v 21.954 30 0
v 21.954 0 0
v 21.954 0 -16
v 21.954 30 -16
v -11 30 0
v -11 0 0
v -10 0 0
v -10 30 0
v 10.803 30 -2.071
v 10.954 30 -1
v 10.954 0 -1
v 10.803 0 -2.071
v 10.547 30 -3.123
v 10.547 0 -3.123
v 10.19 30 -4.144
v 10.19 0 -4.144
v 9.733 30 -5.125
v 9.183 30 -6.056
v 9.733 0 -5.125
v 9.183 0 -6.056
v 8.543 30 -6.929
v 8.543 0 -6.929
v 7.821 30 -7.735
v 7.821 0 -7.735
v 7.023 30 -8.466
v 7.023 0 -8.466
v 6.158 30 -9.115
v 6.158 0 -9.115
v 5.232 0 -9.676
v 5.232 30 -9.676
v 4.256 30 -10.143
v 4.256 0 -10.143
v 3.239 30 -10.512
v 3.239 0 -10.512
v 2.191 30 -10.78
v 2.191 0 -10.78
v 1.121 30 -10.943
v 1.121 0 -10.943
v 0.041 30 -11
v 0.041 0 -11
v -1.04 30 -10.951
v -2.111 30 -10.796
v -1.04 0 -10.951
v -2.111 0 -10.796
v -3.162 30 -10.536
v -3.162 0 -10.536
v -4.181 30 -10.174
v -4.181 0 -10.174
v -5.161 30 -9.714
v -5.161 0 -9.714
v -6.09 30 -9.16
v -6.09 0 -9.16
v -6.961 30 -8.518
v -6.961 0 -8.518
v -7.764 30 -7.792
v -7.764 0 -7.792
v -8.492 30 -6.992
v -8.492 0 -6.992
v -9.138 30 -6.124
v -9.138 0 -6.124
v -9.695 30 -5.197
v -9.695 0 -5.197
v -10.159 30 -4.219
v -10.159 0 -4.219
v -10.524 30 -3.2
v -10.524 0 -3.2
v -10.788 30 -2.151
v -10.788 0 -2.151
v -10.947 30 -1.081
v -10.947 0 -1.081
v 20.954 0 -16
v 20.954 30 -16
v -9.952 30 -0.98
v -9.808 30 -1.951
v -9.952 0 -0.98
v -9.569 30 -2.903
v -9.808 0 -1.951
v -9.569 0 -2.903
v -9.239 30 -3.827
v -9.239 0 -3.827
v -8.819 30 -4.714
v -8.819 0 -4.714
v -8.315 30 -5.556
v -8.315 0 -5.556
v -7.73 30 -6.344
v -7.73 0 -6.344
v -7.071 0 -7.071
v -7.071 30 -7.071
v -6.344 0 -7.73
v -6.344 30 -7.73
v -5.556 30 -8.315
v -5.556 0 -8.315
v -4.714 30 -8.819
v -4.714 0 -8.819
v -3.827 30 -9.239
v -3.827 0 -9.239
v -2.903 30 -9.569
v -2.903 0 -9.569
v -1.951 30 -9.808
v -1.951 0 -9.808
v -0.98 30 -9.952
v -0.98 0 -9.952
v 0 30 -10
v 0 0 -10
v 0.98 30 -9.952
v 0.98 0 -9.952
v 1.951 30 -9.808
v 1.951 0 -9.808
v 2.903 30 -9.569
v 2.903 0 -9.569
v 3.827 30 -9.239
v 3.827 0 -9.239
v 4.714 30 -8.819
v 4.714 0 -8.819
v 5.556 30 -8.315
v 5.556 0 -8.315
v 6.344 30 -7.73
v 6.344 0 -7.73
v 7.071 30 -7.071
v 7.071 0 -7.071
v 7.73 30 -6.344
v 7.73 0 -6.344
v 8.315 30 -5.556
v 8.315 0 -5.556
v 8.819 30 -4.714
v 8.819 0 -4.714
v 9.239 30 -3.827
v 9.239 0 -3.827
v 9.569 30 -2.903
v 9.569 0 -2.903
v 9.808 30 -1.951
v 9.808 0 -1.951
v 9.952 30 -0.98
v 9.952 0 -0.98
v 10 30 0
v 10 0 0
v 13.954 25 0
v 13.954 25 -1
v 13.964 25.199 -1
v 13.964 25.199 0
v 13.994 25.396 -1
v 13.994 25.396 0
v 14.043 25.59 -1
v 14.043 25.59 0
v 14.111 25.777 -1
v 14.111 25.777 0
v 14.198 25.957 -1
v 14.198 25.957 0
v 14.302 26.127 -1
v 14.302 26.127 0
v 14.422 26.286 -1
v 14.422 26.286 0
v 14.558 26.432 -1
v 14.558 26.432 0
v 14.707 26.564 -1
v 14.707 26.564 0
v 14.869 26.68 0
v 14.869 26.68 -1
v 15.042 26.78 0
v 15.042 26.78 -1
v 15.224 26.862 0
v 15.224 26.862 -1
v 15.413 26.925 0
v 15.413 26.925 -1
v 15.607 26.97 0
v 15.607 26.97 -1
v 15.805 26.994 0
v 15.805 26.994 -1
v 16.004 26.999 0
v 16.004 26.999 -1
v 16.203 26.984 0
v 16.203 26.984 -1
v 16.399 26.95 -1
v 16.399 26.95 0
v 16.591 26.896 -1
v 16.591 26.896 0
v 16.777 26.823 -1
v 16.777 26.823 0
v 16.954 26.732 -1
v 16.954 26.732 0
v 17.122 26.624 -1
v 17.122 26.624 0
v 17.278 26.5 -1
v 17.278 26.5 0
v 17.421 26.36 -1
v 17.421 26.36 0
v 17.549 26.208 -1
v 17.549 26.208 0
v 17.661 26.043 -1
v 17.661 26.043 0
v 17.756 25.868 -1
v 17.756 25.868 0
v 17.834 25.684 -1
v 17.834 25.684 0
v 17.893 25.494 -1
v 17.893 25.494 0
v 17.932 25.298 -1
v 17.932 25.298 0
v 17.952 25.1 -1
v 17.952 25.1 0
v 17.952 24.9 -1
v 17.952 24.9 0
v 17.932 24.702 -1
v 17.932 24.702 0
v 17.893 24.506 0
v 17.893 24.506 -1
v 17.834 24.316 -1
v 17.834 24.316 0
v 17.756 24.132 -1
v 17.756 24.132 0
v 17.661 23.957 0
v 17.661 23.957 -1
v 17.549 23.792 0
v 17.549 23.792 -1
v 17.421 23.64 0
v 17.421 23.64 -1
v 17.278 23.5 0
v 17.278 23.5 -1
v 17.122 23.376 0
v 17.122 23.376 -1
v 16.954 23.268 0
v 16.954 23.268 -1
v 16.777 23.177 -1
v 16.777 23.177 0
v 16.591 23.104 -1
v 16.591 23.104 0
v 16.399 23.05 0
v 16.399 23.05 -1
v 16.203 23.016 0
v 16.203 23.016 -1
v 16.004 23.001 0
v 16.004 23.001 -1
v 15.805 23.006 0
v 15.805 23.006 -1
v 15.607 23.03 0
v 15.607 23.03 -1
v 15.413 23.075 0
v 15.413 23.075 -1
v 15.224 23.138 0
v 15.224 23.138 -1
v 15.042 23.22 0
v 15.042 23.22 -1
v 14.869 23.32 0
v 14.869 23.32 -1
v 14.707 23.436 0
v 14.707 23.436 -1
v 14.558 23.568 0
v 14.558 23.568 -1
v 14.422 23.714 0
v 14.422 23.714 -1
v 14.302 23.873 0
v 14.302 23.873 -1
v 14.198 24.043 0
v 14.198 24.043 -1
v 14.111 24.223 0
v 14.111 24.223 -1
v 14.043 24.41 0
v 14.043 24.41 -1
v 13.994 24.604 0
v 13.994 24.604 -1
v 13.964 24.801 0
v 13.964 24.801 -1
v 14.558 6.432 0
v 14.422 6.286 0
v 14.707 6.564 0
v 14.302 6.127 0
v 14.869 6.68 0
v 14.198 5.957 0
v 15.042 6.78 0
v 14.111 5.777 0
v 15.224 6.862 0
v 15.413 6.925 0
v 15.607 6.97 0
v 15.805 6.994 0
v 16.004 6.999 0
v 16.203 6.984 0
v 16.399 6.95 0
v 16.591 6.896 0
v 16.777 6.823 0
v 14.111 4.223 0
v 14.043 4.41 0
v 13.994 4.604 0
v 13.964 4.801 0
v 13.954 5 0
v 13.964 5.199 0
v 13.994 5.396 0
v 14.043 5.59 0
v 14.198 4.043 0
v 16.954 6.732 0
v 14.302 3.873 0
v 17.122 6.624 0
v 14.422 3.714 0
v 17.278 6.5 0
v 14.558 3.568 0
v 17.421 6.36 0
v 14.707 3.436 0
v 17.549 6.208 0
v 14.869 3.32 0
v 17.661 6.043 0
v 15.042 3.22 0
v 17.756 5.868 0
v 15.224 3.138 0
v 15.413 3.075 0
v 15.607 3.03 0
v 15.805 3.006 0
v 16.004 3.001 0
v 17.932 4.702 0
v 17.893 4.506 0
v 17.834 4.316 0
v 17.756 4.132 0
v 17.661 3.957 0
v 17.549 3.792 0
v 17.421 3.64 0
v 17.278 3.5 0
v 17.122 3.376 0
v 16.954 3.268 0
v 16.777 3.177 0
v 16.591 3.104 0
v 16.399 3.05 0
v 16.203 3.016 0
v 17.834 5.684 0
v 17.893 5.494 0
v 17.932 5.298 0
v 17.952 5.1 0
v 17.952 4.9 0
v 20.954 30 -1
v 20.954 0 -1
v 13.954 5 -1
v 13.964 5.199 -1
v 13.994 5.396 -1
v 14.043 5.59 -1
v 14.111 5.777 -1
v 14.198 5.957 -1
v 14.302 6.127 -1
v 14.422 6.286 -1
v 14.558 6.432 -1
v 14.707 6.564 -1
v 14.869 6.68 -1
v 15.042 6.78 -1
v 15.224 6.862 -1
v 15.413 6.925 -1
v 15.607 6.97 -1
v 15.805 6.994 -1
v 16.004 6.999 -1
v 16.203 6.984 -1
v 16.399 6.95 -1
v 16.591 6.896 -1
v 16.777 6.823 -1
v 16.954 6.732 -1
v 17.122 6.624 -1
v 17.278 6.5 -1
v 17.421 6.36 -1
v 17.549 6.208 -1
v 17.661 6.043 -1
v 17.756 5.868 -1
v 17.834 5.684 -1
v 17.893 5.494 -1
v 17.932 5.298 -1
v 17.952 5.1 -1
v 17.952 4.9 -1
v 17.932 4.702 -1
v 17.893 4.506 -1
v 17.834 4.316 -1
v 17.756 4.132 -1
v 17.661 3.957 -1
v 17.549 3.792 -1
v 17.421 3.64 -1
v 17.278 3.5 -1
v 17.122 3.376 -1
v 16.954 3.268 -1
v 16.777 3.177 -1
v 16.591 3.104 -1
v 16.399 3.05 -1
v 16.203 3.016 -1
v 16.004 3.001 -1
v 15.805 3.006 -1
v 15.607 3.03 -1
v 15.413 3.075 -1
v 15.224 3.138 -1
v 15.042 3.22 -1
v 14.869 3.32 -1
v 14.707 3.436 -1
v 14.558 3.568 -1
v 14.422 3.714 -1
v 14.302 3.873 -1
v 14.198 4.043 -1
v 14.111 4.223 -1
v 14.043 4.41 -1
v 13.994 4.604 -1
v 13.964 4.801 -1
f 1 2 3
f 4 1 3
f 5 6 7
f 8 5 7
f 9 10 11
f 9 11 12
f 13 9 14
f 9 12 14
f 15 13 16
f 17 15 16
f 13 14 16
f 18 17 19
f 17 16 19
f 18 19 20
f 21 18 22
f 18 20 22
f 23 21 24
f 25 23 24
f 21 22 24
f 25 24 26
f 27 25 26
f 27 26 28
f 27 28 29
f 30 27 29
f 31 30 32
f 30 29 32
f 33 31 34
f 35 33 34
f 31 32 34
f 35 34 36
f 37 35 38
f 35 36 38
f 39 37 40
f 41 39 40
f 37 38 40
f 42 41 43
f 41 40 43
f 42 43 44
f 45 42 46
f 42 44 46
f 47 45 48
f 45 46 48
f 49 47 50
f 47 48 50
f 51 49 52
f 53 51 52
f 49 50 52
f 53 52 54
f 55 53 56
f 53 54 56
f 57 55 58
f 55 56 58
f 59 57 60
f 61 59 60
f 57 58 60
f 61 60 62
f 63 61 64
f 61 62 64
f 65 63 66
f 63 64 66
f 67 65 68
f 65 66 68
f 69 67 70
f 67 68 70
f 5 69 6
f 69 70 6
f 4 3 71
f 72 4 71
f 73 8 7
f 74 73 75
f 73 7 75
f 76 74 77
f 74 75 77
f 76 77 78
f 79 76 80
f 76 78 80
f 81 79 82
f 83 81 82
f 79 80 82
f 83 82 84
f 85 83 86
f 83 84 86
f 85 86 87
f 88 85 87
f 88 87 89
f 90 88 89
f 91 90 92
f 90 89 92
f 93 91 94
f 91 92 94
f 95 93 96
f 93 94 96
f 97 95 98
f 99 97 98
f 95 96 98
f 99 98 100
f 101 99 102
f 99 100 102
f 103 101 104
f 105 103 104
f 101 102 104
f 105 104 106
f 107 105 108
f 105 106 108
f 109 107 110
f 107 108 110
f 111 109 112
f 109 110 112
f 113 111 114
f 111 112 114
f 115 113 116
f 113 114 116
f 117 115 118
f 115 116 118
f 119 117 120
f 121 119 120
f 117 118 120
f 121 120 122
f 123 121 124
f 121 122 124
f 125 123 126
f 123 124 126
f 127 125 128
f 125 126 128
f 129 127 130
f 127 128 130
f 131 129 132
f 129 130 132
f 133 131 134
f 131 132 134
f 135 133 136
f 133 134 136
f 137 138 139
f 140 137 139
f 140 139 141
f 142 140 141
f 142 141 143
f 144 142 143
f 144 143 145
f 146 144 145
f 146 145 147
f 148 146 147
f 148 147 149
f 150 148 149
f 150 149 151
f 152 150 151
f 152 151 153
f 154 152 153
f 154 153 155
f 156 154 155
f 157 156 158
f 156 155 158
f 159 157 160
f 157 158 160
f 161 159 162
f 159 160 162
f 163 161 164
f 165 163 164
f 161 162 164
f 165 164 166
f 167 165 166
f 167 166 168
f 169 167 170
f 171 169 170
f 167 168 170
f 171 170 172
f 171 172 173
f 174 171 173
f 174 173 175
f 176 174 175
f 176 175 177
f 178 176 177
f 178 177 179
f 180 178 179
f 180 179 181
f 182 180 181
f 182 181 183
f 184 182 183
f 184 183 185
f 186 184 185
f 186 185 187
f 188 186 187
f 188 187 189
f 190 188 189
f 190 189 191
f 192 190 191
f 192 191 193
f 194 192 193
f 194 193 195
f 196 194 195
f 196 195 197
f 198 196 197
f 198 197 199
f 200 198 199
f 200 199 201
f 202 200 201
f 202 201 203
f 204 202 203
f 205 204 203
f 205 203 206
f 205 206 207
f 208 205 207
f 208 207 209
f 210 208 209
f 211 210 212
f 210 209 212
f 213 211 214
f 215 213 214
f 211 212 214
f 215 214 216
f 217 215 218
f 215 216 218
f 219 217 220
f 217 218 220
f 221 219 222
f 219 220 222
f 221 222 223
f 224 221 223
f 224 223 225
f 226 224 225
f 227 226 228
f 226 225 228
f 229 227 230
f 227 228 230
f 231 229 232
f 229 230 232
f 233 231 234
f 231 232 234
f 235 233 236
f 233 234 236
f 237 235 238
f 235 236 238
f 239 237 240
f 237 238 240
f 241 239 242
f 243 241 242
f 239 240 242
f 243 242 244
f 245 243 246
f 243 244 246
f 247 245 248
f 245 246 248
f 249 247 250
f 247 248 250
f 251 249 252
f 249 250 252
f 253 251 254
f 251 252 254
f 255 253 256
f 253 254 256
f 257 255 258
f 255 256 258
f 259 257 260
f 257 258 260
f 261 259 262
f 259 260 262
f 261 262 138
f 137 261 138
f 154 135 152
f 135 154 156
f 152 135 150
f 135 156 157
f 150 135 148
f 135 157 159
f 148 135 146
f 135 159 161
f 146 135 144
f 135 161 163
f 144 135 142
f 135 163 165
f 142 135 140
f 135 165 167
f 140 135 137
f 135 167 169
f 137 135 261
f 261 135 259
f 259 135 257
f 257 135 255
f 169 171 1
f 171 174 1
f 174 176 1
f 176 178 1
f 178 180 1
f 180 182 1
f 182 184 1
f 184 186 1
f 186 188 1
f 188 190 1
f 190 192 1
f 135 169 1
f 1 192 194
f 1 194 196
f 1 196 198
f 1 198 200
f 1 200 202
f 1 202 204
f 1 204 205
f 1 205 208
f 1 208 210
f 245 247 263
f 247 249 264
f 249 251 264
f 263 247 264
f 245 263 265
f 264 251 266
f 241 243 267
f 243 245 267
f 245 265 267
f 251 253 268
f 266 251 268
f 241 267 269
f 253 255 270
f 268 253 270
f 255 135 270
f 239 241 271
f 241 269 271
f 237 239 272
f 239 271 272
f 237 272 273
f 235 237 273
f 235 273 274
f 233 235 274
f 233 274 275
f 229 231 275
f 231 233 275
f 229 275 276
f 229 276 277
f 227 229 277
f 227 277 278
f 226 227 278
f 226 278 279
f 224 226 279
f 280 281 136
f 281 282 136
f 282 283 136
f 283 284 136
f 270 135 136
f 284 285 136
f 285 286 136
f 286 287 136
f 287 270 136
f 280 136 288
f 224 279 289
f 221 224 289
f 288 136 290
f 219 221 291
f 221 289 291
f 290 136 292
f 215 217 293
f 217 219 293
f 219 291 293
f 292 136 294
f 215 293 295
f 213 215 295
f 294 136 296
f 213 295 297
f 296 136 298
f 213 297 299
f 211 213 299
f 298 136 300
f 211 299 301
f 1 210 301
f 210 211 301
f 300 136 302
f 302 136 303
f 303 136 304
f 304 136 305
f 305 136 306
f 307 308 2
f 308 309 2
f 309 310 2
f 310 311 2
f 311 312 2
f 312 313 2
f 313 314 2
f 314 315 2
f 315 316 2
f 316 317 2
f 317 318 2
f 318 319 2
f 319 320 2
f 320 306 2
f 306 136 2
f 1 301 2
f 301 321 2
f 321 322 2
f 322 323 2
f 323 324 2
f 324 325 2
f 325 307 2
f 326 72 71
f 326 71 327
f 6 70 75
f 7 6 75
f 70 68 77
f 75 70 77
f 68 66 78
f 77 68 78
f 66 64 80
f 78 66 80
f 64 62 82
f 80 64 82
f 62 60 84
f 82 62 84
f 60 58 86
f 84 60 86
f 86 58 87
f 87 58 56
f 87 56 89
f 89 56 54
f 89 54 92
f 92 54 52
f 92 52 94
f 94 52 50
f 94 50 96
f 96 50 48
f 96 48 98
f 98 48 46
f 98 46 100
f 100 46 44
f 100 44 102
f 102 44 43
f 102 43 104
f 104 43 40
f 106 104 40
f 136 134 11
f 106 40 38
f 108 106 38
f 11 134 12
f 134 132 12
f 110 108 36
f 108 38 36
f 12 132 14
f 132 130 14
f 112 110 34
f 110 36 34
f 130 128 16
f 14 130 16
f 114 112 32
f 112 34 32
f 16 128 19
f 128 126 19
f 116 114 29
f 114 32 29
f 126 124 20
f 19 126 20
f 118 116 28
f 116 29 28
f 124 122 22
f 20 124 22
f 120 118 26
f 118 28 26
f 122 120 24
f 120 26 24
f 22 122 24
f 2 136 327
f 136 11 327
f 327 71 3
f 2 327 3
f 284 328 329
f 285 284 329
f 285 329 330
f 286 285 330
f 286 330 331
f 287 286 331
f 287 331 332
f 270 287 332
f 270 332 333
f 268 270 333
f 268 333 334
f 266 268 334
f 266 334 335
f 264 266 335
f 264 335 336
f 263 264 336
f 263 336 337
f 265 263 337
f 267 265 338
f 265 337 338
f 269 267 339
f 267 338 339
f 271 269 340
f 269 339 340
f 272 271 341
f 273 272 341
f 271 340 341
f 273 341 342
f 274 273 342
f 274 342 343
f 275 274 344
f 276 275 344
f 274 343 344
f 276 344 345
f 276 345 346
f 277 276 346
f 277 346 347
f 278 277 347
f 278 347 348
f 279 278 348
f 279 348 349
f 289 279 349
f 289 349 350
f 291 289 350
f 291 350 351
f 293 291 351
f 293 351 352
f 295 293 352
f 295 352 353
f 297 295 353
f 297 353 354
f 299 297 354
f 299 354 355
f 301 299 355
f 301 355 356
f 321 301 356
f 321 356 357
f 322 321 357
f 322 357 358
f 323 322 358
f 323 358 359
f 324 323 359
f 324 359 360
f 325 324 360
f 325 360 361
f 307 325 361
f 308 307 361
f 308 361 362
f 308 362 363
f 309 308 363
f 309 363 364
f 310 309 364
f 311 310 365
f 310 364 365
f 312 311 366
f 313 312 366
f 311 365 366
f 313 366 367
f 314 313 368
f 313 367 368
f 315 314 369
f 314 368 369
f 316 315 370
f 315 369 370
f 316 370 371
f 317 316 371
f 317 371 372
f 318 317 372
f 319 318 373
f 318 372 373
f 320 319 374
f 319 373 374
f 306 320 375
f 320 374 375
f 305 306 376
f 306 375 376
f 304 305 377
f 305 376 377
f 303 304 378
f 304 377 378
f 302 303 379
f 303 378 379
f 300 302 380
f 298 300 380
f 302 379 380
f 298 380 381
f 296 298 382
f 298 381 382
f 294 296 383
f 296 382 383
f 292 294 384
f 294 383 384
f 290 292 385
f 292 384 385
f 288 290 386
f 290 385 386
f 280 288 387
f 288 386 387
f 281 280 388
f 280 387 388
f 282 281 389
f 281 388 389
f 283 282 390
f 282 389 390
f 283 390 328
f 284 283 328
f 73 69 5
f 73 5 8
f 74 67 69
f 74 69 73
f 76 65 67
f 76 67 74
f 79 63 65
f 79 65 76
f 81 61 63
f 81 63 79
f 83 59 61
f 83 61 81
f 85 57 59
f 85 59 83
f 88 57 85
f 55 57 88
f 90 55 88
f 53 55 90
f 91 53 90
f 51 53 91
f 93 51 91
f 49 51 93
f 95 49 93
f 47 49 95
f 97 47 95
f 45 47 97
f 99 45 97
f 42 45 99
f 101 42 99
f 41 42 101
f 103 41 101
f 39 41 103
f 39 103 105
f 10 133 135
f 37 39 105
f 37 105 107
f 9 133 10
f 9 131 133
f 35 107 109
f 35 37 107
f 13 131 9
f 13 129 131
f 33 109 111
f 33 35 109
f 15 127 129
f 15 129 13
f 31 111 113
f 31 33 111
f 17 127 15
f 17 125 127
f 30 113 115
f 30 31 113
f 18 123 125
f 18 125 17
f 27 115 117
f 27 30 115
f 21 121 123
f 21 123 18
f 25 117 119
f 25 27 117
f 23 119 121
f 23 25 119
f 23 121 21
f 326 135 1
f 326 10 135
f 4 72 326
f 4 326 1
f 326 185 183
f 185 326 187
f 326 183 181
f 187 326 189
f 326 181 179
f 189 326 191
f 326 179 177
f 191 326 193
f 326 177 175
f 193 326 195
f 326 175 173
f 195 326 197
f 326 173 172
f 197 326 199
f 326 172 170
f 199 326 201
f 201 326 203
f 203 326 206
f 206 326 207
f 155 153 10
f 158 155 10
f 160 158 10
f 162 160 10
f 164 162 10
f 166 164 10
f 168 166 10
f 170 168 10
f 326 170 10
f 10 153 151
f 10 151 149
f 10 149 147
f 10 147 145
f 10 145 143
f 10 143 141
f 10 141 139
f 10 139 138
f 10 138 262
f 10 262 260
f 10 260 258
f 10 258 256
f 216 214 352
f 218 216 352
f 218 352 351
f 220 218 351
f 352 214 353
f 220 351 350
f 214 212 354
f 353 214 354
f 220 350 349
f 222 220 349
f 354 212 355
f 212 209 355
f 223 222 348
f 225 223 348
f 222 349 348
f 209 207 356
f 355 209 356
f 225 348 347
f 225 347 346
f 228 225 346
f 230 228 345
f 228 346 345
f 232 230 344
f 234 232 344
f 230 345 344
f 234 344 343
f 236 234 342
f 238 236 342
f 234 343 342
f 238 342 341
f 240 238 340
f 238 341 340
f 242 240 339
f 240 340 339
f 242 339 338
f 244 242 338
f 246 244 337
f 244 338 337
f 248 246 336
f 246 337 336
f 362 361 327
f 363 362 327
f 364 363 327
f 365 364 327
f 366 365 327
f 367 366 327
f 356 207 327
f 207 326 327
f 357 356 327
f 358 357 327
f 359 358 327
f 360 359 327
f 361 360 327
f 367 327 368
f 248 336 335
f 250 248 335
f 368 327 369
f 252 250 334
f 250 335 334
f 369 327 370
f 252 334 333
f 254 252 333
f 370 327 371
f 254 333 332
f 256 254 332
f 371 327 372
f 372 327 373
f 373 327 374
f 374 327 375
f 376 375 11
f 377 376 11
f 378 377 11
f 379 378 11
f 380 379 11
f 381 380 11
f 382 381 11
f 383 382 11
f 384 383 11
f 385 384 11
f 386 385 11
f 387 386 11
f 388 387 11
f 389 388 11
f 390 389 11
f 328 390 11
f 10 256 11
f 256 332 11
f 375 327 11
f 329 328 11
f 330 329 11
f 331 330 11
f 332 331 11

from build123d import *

# Parameters (mm, degrees)
BOSS_EXTRUDE1_DEPTH = 30
SKETCH2_R           = 2
CUT_EXTRUDE1_DEPTH  = 30


with BuildPart() as part:
    # Sketch1 → Boss-Extrude1 (new body)
    with BuildSketch(Plane(origin=(0, 0, 0), x_dir=(1, 0, 0), z_dir=(0, 1, 0))):
        with BuildLine():
            Line((10, 0), (20.95445115, 0))
            Line((20.95445115, 0), (21.95445115, 0))
            Line((21.95445115, 0), (21.95445115, 16))
            Line((21.95445115, 16), (20.95445115, 16))
            Line((20.95445115, 16), (20.95445115, 1))
            Line((20.95445115, 1), (10.95445115, 1))
            ThreePointArc((10.95445115, 1), (-0.500518406, 10.988606887), (-11, 0))
            Line((-11, 0), (-10, 0))
            ThreePointArc((-10, 0), (0, 10), (10, 0))
        make_face()
    extrude(amount=BOSS_EXTRUDE1_DEPTH)

    # Sketch2 → Cut-Extrude1 (cut)
    with BuildSketch(Plane(origin=(0, 0, -1), x_dir=(-1, 0, 0), z_dir=(0, 0, -1))):
        with Locations((-15.95445115, 25)):
            Circle(SKETCH2_R)
        with Locations((-15.95445115, 5)):
            Circle(SKETCH2_R)
    extrude(amount=-CUT_EXTRUDE1_DEPTH, mode=Mode.SUBTRACT)


solid = part.part
